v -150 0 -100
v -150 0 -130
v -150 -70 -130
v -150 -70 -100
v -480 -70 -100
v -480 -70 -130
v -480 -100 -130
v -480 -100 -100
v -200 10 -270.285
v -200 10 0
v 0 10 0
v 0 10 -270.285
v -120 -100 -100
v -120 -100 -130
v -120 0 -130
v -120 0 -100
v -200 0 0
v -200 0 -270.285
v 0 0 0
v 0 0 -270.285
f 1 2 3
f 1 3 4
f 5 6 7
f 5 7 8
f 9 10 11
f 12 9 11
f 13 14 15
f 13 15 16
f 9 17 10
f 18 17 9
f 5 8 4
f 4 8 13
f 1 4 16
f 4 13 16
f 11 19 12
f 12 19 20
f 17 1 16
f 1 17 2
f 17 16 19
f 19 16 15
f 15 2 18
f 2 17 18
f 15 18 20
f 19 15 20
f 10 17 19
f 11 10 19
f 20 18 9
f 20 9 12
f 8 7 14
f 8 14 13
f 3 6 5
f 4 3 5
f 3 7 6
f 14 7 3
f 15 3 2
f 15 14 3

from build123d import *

# Parameters (mm, degrees)
SKETCH1_W      = 200
SKETCH1_H      = 270.285174582
EXTRUDE1_DEPTH = 10
SKETCH2_W      = 30
SKETCH2_H      = 30
EXTRUDE2_DEPTH = 100
SKETCH3_W      = 30
SKETCH3_H      = 30
EXTRUDE3_DEPTH = 330


with BuildPart() as part:
    # Sketch1 → Extrude1 (new body)
    with BuildSketch(Plane(origin=(0, 0, 0), x_dir=(1, 0, 0), z_dir=(0, 1, 0))):
        with Locations((-100, 135.142587291)):
            Rectangle(SKETCH1_W, SKETCH1_H)
    extrude(amount=EXTRUDE1_DEPTH)

    # Sketch2 → Extrude2 (add)
    with BuildSketch(Plane.XZ):
        with Locations((-135, -115)):
            Rectangle(SKETCH2_W, SKETCH2_H)
    extrude(amount=EXTRUDE2_DEPTH)

    # Sketch3 → Extrude3 (add)
    with BuildSketch(Plane.ZY.offset(150)):
        with Locations((-115, -85)):
            Rectangle(SKETCH3_W, SKETCH3_H)
    extrude(amount=EXTRUDE3_DEPTH)


solid = part.part
